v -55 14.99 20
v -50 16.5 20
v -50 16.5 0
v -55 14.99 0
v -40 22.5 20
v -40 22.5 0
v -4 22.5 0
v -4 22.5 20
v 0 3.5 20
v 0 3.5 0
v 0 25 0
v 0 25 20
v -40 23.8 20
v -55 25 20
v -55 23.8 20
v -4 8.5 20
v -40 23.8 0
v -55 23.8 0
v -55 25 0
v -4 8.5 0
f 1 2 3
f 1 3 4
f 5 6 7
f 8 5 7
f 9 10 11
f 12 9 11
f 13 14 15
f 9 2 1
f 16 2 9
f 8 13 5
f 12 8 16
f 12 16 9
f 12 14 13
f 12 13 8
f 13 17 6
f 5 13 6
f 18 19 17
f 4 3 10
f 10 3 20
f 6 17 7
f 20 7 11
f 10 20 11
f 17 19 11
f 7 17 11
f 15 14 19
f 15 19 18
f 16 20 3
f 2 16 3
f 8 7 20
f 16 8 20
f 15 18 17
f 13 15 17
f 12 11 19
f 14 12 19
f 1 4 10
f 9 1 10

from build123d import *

# Parameters (mm, degrees)
PAD_DEPTH = 20


with BuildPart() as part:
    # Sketch → Pad (new body)
    with BuildSketch(Plane.XY):
        Polygon((-40, 22.5), (-4, 22.5), (-4, 8.5), (-50, 16.5), (-55, 14.989843), (0, 3.5), (0, 25), (-55, 25), (-55, 23.8), (-40, 23.8), align=None)
    extrude(amount=PAD_DEPTH)


solid = part.part
